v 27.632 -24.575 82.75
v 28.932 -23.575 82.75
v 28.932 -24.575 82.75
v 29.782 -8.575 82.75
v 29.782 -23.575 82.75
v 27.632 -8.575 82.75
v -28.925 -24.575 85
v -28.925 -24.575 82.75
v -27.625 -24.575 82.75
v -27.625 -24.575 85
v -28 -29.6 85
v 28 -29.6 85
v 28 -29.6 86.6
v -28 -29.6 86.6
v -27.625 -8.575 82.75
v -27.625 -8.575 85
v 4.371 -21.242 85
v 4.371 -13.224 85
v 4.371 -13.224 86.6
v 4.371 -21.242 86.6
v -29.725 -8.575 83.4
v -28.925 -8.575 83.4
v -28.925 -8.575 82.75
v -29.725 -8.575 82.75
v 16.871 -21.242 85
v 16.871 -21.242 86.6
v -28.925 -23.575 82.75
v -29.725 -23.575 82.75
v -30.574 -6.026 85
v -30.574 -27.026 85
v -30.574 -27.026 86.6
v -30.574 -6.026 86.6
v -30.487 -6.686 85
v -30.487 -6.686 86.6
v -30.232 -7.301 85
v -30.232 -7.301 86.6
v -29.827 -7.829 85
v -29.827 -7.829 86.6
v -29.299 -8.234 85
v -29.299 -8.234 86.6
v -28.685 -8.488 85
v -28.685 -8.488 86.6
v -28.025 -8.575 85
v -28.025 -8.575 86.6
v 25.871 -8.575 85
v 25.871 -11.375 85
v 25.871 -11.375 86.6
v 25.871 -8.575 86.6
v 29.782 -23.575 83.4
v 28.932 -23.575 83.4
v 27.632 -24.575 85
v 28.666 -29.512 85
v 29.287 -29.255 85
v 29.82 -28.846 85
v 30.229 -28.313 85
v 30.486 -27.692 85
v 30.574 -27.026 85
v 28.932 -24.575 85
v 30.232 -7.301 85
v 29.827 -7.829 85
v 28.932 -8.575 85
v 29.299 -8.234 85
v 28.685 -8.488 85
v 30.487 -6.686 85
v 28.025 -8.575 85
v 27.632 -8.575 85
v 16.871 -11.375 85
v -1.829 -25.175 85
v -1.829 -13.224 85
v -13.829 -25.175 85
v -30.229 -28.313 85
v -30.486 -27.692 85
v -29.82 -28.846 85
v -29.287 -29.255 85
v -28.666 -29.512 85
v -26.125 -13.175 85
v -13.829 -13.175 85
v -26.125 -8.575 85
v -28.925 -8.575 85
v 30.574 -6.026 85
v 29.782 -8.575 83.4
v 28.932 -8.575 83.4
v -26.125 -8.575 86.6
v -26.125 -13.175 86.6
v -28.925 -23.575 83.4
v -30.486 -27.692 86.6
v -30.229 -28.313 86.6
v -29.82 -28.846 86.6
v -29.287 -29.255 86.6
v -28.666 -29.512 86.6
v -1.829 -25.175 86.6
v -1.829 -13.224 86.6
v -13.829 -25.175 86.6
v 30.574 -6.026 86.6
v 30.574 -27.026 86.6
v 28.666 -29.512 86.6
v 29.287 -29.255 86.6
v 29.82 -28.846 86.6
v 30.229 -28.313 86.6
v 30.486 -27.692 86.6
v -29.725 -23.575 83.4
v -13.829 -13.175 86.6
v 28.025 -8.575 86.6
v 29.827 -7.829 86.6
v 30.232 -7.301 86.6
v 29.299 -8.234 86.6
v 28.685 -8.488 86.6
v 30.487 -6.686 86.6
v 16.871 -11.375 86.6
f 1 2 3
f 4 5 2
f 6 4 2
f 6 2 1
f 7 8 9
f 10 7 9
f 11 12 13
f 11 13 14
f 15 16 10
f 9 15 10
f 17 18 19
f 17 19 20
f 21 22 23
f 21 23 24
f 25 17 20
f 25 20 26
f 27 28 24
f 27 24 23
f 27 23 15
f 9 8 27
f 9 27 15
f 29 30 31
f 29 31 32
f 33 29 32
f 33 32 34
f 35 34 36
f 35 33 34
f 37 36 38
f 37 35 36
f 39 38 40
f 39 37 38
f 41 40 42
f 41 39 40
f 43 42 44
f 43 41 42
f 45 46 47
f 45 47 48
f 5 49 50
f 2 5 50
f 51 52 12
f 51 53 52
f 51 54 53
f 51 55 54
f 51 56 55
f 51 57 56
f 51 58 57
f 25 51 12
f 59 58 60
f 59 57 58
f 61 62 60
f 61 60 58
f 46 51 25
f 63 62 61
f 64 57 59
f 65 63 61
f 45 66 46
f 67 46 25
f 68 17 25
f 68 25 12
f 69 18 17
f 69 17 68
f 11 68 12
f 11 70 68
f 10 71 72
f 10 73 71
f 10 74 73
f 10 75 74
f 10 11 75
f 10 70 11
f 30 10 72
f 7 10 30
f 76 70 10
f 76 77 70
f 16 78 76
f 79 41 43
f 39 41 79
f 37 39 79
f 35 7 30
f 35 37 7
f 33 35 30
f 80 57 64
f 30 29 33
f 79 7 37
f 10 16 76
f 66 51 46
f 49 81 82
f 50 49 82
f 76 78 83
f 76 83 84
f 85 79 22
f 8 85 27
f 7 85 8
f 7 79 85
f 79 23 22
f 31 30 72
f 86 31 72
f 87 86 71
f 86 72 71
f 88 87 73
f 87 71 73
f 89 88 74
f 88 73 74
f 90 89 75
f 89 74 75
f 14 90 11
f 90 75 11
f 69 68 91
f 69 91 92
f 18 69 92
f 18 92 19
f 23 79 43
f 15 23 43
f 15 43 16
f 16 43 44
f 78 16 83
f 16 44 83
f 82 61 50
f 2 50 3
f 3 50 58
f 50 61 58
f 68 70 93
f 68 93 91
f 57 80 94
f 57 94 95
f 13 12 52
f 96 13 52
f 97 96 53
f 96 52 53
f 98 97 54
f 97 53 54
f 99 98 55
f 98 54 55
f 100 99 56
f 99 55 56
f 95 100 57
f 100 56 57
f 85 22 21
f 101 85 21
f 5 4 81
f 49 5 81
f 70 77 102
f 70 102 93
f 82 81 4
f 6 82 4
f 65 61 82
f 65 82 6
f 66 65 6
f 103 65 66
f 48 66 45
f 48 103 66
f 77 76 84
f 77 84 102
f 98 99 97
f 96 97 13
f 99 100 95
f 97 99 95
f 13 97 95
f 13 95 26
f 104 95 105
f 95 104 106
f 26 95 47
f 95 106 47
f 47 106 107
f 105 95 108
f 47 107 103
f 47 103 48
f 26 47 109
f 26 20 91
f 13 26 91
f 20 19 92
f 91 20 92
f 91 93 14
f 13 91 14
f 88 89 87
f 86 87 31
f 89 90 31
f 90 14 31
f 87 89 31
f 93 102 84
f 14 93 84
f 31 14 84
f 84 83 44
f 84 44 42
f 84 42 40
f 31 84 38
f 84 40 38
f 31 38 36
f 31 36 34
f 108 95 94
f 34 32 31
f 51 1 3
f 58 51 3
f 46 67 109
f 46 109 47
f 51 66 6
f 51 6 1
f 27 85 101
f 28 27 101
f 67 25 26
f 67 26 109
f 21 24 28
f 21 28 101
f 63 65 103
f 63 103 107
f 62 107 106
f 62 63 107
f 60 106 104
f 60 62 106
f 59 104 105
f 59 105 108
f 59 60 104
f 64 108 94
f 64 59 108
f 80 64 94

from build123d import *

# Parameters (mm, degrees)
PAD003_DEPTH  = 1.6
SKETCH011_W   = 1.3
SKETCH011_H   = 16
PAD004_DEPTH  = 2.25
SKETCH012_W   = 0.8
SKETCH012_H   = 0.65
SKETCH012_W_2 = 0.85
PAD005_DEPTH  = 15


with BuildPart() as part:
    # Sketch008 → Pad003 (new body)
    with BuildSketch(Plane.XY.offset(85)):
        with BuildLine():
            Line((30.57387, -6.02613), (30.57387, -27.02613))
            ThreePointArc((28, -29.6), (29.820001, -28.846131), (30.57387, -27.02613))
            Line((28, -29.6), (-28, -29.6))
            ThreePointArc((-30.57387, -27.02613), (-29.820001, -28.846131), (-28, -29.6))
            Line((-30.57387, -27.02613), (-30.57387, -6.02613))
            ThreePointArc((-30.57387, -6.02613), (-29.827262, -7.828601), (-28.02479, -8.575209))
            Line((-28.02479, -8.575209), (-26.12479, -8.575209))
            Line((-26.12479, -8.575209), (-26.12479, -13.175209))
            Line((-26.12479, -13.175209), (-13.82859, -13.175209))
            Line((-13.82859, -13.175209), (-13.82859, -25.175209))
            Line((-13.82859, -25.175209), (-1.82859, -25.175209))
            Line((-1.82859, -25.175209), (-1.82859, -13.224409))
            Line((-1.82859, -13.224409), (4.37141, -13.224409))
            Line((4.37141, -13.224409), (4.37141, -21.24222))
            Line((4.37141, -21.24222), (16.87141, -21.24222))
            Line((16.87141, -21.24222), (16.87141, -11.37521))
            Line((16.87141, -11.37521), (25.87141, -11.37521))
            Line((25.87141, -11.37521), (25.87141, -8.57521))
            Line((25.87141, -8.57521), (28.02479, -8.57521))
            ThreePointArc((28.02479, -8.57521), (29.827262, -7.828602), (30.57387, -6.02613))
        make_face()
    extrude(amount=PAD003_DEPTH)

    # Sketch011 → Pad004 (new body)
    with BuildSketch(Plane(origin=(0, 0, 85), x_dir=(1, 0, 0), z_dir=(0, 0, -1))):
        with Locations((-28.27479, 16.575209)):
            Rectangle(SKETCH011_W, SKETCH011_H)
        with Locations((28.281635, 16.57521)):
            Rectangle(SKETCH011_W, SKETCH011_H)
    extrude(amount=PAD004_DEPTH)

    # Sketch012 → Pad005 (new body)
    with BuildSketch(Plane(origin=(0, -8.57521, 85), x_dir=(-1, 0, 0), z_dir=(0, 1, 0))):
        with Locations((29.32479, -1.925)):
            Rectangle(SKETCH012_W, SKETCH012_H)
        with Locations((-29.356635, -1.925)):
            Rectangle(SKETCH012_W_2, SKETCH012_H)
    extrude(amount=-PAD005_DEPTH)


solid = part.part
